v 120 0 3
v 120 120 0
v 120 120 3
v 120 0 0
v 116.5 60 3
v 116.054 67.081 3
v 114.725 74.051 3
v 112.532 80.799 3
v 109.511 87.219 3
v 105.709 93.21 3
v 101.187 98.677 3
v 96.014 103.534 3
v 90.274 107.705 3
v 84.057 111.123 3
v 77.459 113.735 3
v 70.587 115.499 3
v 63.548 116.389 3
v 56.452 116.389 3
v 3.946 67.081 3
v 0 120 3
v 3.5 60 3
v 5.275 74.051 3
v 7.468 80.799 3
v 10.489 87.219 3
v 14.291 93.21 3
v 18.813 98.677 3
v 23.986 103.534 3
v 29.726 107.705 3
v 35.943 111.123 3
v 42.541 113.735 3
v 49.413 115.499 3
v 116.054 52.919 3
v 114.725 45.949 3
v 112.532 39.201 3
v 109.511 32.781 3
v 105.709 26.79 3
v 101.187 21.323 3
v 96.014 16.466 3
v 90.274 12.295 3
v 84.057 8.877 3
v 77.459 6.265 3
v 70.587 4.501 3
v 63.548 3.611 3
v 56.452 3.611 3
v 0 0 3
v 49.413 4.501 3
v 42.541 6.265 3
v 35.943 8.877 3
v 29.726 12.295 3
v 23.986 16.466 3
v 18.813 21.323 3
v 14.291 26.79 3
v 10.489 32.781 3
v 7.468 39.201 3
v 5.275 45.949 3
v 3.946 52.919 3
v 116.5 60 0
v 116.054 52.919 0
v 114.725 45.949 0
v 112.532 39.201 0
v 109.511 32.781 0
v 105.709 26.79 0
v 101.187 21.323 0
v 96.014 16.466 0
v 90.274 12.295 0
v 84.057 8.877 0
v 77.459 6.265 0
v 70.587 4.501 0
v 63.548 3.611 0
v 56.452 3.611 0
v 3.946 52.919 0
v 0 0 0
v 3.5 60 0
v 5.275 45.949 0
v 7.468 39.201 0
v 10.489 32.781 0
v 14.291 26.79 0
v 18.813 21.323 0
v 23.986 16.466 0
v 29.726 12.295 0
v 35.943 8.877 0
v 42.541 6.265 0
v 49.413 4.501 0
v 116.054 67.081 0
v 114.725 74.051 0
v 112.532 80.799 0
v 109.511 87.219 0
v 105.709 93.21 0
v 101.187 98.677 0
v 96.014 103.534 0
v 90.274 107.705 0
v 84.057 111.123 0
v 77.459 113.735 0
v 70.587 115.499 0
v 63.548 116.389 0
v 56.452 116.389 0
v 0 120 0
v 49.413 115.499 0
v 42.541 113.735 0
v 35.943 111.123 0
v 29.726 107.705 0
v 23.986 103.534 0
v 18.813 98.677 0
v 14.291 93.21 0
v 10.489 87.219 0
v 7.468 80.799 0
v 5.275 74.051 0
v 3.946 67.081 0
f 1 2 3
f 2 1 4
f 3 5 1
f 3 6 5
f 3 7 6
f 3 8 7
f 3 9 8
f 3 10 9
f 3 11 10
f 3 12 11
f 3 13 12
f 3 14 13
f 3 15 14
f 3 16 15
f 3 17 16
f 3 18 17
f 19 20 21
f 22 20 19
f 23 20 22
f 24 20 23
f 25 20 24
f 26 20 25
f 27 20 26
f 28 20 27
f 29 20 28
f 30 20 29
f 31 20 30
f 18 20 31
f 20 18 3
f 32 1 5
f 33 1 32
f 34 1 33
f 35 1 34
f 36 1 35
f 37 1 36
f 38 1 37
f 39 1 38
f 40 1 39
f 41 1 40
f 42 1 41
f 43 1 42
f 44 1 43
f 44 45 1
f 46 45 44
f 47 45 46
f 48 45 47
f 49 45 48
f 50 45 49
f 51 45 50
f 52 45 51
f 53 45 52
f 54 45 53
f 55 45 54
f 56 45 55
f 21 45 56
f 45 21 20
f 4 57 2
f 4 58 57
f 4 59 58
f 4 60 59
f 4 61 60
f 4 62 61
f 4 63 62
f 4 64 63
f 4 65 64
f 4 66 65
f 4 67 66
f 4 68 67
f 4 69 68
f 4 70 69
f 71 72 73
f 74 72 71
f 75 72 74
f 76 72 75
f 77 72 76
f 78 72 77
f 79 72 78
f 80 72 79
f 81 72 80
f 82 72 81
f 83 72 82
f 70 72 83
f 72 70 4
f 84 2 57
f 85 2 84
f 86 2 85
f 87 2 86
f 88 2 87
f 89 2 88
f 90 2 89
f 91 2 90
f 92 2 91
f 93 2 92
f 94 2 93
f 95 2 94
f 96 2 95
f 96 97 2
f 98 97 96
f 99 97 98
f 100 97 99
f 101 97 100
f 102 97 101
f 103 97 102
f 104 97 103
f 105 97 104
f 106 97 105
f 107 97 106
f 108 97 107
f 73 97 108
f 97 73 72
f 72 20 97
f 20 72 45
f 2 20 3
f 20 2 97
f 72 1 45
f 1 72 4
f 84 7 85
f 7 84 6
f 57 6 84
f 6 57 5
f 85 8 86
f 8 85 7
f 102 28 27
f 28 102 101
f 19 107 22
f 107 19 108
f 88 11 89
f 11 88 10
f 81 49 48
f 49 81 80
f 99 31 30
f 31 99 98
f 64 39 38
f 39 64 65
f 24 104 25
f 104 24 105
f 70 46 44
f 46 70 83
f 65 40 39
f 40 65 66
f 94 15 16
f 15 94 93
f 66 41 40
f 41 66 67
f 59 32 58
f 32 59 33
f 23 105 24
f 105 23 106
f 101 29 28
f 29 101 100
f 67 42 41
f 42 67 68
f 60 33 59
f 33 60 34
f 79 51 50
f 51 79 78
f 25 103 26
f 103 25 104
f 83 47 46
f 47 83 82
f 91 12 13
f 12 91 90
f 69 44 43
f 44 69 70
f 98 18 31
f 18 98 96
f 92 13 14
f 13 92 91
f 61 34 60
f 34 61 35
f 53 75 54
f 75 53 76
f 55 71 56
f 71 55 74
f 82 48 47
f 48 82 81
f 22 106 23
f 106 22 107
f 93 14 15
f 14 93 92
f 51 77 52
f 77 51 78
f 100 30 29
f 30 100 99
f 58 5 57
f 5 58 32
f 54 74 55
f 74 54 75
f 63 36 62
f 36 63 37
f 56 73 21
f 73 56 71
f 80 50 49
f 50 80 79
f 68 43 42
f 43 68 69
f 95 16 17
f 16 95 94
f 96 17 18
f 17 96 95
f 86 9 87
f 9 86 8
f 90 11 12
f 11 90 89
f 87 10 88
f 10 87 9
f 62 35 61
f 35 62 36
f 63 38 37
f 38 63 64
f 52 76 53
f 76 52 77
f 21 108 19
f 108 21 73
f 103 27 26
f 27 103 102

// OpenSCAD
//
// USBカメラ用固定板
//
// USBcameraBaseplate-2-20260212A.scad
//
// Last update: 2026-02-10(Tue) 07:54 JST / 2026-02-09(Mon) 22:54 UTC
//

// パネルサイズと穴位置
Px = 120.0; Py = 120.0; Pz = 3.0;   // 縦・横・厚
Hd = 113.0;                         // 穴径。ちょっと大きめ


// ベースパネルに  穴4つ（角から Hp だけ内側に）
difference() {
  cube([Px, Py, Pz]);
      translate([Px/2, Py/2, -1.0])
        cylinder(h = Pz + 2.0, d = Hd, $fn = 50);
}
